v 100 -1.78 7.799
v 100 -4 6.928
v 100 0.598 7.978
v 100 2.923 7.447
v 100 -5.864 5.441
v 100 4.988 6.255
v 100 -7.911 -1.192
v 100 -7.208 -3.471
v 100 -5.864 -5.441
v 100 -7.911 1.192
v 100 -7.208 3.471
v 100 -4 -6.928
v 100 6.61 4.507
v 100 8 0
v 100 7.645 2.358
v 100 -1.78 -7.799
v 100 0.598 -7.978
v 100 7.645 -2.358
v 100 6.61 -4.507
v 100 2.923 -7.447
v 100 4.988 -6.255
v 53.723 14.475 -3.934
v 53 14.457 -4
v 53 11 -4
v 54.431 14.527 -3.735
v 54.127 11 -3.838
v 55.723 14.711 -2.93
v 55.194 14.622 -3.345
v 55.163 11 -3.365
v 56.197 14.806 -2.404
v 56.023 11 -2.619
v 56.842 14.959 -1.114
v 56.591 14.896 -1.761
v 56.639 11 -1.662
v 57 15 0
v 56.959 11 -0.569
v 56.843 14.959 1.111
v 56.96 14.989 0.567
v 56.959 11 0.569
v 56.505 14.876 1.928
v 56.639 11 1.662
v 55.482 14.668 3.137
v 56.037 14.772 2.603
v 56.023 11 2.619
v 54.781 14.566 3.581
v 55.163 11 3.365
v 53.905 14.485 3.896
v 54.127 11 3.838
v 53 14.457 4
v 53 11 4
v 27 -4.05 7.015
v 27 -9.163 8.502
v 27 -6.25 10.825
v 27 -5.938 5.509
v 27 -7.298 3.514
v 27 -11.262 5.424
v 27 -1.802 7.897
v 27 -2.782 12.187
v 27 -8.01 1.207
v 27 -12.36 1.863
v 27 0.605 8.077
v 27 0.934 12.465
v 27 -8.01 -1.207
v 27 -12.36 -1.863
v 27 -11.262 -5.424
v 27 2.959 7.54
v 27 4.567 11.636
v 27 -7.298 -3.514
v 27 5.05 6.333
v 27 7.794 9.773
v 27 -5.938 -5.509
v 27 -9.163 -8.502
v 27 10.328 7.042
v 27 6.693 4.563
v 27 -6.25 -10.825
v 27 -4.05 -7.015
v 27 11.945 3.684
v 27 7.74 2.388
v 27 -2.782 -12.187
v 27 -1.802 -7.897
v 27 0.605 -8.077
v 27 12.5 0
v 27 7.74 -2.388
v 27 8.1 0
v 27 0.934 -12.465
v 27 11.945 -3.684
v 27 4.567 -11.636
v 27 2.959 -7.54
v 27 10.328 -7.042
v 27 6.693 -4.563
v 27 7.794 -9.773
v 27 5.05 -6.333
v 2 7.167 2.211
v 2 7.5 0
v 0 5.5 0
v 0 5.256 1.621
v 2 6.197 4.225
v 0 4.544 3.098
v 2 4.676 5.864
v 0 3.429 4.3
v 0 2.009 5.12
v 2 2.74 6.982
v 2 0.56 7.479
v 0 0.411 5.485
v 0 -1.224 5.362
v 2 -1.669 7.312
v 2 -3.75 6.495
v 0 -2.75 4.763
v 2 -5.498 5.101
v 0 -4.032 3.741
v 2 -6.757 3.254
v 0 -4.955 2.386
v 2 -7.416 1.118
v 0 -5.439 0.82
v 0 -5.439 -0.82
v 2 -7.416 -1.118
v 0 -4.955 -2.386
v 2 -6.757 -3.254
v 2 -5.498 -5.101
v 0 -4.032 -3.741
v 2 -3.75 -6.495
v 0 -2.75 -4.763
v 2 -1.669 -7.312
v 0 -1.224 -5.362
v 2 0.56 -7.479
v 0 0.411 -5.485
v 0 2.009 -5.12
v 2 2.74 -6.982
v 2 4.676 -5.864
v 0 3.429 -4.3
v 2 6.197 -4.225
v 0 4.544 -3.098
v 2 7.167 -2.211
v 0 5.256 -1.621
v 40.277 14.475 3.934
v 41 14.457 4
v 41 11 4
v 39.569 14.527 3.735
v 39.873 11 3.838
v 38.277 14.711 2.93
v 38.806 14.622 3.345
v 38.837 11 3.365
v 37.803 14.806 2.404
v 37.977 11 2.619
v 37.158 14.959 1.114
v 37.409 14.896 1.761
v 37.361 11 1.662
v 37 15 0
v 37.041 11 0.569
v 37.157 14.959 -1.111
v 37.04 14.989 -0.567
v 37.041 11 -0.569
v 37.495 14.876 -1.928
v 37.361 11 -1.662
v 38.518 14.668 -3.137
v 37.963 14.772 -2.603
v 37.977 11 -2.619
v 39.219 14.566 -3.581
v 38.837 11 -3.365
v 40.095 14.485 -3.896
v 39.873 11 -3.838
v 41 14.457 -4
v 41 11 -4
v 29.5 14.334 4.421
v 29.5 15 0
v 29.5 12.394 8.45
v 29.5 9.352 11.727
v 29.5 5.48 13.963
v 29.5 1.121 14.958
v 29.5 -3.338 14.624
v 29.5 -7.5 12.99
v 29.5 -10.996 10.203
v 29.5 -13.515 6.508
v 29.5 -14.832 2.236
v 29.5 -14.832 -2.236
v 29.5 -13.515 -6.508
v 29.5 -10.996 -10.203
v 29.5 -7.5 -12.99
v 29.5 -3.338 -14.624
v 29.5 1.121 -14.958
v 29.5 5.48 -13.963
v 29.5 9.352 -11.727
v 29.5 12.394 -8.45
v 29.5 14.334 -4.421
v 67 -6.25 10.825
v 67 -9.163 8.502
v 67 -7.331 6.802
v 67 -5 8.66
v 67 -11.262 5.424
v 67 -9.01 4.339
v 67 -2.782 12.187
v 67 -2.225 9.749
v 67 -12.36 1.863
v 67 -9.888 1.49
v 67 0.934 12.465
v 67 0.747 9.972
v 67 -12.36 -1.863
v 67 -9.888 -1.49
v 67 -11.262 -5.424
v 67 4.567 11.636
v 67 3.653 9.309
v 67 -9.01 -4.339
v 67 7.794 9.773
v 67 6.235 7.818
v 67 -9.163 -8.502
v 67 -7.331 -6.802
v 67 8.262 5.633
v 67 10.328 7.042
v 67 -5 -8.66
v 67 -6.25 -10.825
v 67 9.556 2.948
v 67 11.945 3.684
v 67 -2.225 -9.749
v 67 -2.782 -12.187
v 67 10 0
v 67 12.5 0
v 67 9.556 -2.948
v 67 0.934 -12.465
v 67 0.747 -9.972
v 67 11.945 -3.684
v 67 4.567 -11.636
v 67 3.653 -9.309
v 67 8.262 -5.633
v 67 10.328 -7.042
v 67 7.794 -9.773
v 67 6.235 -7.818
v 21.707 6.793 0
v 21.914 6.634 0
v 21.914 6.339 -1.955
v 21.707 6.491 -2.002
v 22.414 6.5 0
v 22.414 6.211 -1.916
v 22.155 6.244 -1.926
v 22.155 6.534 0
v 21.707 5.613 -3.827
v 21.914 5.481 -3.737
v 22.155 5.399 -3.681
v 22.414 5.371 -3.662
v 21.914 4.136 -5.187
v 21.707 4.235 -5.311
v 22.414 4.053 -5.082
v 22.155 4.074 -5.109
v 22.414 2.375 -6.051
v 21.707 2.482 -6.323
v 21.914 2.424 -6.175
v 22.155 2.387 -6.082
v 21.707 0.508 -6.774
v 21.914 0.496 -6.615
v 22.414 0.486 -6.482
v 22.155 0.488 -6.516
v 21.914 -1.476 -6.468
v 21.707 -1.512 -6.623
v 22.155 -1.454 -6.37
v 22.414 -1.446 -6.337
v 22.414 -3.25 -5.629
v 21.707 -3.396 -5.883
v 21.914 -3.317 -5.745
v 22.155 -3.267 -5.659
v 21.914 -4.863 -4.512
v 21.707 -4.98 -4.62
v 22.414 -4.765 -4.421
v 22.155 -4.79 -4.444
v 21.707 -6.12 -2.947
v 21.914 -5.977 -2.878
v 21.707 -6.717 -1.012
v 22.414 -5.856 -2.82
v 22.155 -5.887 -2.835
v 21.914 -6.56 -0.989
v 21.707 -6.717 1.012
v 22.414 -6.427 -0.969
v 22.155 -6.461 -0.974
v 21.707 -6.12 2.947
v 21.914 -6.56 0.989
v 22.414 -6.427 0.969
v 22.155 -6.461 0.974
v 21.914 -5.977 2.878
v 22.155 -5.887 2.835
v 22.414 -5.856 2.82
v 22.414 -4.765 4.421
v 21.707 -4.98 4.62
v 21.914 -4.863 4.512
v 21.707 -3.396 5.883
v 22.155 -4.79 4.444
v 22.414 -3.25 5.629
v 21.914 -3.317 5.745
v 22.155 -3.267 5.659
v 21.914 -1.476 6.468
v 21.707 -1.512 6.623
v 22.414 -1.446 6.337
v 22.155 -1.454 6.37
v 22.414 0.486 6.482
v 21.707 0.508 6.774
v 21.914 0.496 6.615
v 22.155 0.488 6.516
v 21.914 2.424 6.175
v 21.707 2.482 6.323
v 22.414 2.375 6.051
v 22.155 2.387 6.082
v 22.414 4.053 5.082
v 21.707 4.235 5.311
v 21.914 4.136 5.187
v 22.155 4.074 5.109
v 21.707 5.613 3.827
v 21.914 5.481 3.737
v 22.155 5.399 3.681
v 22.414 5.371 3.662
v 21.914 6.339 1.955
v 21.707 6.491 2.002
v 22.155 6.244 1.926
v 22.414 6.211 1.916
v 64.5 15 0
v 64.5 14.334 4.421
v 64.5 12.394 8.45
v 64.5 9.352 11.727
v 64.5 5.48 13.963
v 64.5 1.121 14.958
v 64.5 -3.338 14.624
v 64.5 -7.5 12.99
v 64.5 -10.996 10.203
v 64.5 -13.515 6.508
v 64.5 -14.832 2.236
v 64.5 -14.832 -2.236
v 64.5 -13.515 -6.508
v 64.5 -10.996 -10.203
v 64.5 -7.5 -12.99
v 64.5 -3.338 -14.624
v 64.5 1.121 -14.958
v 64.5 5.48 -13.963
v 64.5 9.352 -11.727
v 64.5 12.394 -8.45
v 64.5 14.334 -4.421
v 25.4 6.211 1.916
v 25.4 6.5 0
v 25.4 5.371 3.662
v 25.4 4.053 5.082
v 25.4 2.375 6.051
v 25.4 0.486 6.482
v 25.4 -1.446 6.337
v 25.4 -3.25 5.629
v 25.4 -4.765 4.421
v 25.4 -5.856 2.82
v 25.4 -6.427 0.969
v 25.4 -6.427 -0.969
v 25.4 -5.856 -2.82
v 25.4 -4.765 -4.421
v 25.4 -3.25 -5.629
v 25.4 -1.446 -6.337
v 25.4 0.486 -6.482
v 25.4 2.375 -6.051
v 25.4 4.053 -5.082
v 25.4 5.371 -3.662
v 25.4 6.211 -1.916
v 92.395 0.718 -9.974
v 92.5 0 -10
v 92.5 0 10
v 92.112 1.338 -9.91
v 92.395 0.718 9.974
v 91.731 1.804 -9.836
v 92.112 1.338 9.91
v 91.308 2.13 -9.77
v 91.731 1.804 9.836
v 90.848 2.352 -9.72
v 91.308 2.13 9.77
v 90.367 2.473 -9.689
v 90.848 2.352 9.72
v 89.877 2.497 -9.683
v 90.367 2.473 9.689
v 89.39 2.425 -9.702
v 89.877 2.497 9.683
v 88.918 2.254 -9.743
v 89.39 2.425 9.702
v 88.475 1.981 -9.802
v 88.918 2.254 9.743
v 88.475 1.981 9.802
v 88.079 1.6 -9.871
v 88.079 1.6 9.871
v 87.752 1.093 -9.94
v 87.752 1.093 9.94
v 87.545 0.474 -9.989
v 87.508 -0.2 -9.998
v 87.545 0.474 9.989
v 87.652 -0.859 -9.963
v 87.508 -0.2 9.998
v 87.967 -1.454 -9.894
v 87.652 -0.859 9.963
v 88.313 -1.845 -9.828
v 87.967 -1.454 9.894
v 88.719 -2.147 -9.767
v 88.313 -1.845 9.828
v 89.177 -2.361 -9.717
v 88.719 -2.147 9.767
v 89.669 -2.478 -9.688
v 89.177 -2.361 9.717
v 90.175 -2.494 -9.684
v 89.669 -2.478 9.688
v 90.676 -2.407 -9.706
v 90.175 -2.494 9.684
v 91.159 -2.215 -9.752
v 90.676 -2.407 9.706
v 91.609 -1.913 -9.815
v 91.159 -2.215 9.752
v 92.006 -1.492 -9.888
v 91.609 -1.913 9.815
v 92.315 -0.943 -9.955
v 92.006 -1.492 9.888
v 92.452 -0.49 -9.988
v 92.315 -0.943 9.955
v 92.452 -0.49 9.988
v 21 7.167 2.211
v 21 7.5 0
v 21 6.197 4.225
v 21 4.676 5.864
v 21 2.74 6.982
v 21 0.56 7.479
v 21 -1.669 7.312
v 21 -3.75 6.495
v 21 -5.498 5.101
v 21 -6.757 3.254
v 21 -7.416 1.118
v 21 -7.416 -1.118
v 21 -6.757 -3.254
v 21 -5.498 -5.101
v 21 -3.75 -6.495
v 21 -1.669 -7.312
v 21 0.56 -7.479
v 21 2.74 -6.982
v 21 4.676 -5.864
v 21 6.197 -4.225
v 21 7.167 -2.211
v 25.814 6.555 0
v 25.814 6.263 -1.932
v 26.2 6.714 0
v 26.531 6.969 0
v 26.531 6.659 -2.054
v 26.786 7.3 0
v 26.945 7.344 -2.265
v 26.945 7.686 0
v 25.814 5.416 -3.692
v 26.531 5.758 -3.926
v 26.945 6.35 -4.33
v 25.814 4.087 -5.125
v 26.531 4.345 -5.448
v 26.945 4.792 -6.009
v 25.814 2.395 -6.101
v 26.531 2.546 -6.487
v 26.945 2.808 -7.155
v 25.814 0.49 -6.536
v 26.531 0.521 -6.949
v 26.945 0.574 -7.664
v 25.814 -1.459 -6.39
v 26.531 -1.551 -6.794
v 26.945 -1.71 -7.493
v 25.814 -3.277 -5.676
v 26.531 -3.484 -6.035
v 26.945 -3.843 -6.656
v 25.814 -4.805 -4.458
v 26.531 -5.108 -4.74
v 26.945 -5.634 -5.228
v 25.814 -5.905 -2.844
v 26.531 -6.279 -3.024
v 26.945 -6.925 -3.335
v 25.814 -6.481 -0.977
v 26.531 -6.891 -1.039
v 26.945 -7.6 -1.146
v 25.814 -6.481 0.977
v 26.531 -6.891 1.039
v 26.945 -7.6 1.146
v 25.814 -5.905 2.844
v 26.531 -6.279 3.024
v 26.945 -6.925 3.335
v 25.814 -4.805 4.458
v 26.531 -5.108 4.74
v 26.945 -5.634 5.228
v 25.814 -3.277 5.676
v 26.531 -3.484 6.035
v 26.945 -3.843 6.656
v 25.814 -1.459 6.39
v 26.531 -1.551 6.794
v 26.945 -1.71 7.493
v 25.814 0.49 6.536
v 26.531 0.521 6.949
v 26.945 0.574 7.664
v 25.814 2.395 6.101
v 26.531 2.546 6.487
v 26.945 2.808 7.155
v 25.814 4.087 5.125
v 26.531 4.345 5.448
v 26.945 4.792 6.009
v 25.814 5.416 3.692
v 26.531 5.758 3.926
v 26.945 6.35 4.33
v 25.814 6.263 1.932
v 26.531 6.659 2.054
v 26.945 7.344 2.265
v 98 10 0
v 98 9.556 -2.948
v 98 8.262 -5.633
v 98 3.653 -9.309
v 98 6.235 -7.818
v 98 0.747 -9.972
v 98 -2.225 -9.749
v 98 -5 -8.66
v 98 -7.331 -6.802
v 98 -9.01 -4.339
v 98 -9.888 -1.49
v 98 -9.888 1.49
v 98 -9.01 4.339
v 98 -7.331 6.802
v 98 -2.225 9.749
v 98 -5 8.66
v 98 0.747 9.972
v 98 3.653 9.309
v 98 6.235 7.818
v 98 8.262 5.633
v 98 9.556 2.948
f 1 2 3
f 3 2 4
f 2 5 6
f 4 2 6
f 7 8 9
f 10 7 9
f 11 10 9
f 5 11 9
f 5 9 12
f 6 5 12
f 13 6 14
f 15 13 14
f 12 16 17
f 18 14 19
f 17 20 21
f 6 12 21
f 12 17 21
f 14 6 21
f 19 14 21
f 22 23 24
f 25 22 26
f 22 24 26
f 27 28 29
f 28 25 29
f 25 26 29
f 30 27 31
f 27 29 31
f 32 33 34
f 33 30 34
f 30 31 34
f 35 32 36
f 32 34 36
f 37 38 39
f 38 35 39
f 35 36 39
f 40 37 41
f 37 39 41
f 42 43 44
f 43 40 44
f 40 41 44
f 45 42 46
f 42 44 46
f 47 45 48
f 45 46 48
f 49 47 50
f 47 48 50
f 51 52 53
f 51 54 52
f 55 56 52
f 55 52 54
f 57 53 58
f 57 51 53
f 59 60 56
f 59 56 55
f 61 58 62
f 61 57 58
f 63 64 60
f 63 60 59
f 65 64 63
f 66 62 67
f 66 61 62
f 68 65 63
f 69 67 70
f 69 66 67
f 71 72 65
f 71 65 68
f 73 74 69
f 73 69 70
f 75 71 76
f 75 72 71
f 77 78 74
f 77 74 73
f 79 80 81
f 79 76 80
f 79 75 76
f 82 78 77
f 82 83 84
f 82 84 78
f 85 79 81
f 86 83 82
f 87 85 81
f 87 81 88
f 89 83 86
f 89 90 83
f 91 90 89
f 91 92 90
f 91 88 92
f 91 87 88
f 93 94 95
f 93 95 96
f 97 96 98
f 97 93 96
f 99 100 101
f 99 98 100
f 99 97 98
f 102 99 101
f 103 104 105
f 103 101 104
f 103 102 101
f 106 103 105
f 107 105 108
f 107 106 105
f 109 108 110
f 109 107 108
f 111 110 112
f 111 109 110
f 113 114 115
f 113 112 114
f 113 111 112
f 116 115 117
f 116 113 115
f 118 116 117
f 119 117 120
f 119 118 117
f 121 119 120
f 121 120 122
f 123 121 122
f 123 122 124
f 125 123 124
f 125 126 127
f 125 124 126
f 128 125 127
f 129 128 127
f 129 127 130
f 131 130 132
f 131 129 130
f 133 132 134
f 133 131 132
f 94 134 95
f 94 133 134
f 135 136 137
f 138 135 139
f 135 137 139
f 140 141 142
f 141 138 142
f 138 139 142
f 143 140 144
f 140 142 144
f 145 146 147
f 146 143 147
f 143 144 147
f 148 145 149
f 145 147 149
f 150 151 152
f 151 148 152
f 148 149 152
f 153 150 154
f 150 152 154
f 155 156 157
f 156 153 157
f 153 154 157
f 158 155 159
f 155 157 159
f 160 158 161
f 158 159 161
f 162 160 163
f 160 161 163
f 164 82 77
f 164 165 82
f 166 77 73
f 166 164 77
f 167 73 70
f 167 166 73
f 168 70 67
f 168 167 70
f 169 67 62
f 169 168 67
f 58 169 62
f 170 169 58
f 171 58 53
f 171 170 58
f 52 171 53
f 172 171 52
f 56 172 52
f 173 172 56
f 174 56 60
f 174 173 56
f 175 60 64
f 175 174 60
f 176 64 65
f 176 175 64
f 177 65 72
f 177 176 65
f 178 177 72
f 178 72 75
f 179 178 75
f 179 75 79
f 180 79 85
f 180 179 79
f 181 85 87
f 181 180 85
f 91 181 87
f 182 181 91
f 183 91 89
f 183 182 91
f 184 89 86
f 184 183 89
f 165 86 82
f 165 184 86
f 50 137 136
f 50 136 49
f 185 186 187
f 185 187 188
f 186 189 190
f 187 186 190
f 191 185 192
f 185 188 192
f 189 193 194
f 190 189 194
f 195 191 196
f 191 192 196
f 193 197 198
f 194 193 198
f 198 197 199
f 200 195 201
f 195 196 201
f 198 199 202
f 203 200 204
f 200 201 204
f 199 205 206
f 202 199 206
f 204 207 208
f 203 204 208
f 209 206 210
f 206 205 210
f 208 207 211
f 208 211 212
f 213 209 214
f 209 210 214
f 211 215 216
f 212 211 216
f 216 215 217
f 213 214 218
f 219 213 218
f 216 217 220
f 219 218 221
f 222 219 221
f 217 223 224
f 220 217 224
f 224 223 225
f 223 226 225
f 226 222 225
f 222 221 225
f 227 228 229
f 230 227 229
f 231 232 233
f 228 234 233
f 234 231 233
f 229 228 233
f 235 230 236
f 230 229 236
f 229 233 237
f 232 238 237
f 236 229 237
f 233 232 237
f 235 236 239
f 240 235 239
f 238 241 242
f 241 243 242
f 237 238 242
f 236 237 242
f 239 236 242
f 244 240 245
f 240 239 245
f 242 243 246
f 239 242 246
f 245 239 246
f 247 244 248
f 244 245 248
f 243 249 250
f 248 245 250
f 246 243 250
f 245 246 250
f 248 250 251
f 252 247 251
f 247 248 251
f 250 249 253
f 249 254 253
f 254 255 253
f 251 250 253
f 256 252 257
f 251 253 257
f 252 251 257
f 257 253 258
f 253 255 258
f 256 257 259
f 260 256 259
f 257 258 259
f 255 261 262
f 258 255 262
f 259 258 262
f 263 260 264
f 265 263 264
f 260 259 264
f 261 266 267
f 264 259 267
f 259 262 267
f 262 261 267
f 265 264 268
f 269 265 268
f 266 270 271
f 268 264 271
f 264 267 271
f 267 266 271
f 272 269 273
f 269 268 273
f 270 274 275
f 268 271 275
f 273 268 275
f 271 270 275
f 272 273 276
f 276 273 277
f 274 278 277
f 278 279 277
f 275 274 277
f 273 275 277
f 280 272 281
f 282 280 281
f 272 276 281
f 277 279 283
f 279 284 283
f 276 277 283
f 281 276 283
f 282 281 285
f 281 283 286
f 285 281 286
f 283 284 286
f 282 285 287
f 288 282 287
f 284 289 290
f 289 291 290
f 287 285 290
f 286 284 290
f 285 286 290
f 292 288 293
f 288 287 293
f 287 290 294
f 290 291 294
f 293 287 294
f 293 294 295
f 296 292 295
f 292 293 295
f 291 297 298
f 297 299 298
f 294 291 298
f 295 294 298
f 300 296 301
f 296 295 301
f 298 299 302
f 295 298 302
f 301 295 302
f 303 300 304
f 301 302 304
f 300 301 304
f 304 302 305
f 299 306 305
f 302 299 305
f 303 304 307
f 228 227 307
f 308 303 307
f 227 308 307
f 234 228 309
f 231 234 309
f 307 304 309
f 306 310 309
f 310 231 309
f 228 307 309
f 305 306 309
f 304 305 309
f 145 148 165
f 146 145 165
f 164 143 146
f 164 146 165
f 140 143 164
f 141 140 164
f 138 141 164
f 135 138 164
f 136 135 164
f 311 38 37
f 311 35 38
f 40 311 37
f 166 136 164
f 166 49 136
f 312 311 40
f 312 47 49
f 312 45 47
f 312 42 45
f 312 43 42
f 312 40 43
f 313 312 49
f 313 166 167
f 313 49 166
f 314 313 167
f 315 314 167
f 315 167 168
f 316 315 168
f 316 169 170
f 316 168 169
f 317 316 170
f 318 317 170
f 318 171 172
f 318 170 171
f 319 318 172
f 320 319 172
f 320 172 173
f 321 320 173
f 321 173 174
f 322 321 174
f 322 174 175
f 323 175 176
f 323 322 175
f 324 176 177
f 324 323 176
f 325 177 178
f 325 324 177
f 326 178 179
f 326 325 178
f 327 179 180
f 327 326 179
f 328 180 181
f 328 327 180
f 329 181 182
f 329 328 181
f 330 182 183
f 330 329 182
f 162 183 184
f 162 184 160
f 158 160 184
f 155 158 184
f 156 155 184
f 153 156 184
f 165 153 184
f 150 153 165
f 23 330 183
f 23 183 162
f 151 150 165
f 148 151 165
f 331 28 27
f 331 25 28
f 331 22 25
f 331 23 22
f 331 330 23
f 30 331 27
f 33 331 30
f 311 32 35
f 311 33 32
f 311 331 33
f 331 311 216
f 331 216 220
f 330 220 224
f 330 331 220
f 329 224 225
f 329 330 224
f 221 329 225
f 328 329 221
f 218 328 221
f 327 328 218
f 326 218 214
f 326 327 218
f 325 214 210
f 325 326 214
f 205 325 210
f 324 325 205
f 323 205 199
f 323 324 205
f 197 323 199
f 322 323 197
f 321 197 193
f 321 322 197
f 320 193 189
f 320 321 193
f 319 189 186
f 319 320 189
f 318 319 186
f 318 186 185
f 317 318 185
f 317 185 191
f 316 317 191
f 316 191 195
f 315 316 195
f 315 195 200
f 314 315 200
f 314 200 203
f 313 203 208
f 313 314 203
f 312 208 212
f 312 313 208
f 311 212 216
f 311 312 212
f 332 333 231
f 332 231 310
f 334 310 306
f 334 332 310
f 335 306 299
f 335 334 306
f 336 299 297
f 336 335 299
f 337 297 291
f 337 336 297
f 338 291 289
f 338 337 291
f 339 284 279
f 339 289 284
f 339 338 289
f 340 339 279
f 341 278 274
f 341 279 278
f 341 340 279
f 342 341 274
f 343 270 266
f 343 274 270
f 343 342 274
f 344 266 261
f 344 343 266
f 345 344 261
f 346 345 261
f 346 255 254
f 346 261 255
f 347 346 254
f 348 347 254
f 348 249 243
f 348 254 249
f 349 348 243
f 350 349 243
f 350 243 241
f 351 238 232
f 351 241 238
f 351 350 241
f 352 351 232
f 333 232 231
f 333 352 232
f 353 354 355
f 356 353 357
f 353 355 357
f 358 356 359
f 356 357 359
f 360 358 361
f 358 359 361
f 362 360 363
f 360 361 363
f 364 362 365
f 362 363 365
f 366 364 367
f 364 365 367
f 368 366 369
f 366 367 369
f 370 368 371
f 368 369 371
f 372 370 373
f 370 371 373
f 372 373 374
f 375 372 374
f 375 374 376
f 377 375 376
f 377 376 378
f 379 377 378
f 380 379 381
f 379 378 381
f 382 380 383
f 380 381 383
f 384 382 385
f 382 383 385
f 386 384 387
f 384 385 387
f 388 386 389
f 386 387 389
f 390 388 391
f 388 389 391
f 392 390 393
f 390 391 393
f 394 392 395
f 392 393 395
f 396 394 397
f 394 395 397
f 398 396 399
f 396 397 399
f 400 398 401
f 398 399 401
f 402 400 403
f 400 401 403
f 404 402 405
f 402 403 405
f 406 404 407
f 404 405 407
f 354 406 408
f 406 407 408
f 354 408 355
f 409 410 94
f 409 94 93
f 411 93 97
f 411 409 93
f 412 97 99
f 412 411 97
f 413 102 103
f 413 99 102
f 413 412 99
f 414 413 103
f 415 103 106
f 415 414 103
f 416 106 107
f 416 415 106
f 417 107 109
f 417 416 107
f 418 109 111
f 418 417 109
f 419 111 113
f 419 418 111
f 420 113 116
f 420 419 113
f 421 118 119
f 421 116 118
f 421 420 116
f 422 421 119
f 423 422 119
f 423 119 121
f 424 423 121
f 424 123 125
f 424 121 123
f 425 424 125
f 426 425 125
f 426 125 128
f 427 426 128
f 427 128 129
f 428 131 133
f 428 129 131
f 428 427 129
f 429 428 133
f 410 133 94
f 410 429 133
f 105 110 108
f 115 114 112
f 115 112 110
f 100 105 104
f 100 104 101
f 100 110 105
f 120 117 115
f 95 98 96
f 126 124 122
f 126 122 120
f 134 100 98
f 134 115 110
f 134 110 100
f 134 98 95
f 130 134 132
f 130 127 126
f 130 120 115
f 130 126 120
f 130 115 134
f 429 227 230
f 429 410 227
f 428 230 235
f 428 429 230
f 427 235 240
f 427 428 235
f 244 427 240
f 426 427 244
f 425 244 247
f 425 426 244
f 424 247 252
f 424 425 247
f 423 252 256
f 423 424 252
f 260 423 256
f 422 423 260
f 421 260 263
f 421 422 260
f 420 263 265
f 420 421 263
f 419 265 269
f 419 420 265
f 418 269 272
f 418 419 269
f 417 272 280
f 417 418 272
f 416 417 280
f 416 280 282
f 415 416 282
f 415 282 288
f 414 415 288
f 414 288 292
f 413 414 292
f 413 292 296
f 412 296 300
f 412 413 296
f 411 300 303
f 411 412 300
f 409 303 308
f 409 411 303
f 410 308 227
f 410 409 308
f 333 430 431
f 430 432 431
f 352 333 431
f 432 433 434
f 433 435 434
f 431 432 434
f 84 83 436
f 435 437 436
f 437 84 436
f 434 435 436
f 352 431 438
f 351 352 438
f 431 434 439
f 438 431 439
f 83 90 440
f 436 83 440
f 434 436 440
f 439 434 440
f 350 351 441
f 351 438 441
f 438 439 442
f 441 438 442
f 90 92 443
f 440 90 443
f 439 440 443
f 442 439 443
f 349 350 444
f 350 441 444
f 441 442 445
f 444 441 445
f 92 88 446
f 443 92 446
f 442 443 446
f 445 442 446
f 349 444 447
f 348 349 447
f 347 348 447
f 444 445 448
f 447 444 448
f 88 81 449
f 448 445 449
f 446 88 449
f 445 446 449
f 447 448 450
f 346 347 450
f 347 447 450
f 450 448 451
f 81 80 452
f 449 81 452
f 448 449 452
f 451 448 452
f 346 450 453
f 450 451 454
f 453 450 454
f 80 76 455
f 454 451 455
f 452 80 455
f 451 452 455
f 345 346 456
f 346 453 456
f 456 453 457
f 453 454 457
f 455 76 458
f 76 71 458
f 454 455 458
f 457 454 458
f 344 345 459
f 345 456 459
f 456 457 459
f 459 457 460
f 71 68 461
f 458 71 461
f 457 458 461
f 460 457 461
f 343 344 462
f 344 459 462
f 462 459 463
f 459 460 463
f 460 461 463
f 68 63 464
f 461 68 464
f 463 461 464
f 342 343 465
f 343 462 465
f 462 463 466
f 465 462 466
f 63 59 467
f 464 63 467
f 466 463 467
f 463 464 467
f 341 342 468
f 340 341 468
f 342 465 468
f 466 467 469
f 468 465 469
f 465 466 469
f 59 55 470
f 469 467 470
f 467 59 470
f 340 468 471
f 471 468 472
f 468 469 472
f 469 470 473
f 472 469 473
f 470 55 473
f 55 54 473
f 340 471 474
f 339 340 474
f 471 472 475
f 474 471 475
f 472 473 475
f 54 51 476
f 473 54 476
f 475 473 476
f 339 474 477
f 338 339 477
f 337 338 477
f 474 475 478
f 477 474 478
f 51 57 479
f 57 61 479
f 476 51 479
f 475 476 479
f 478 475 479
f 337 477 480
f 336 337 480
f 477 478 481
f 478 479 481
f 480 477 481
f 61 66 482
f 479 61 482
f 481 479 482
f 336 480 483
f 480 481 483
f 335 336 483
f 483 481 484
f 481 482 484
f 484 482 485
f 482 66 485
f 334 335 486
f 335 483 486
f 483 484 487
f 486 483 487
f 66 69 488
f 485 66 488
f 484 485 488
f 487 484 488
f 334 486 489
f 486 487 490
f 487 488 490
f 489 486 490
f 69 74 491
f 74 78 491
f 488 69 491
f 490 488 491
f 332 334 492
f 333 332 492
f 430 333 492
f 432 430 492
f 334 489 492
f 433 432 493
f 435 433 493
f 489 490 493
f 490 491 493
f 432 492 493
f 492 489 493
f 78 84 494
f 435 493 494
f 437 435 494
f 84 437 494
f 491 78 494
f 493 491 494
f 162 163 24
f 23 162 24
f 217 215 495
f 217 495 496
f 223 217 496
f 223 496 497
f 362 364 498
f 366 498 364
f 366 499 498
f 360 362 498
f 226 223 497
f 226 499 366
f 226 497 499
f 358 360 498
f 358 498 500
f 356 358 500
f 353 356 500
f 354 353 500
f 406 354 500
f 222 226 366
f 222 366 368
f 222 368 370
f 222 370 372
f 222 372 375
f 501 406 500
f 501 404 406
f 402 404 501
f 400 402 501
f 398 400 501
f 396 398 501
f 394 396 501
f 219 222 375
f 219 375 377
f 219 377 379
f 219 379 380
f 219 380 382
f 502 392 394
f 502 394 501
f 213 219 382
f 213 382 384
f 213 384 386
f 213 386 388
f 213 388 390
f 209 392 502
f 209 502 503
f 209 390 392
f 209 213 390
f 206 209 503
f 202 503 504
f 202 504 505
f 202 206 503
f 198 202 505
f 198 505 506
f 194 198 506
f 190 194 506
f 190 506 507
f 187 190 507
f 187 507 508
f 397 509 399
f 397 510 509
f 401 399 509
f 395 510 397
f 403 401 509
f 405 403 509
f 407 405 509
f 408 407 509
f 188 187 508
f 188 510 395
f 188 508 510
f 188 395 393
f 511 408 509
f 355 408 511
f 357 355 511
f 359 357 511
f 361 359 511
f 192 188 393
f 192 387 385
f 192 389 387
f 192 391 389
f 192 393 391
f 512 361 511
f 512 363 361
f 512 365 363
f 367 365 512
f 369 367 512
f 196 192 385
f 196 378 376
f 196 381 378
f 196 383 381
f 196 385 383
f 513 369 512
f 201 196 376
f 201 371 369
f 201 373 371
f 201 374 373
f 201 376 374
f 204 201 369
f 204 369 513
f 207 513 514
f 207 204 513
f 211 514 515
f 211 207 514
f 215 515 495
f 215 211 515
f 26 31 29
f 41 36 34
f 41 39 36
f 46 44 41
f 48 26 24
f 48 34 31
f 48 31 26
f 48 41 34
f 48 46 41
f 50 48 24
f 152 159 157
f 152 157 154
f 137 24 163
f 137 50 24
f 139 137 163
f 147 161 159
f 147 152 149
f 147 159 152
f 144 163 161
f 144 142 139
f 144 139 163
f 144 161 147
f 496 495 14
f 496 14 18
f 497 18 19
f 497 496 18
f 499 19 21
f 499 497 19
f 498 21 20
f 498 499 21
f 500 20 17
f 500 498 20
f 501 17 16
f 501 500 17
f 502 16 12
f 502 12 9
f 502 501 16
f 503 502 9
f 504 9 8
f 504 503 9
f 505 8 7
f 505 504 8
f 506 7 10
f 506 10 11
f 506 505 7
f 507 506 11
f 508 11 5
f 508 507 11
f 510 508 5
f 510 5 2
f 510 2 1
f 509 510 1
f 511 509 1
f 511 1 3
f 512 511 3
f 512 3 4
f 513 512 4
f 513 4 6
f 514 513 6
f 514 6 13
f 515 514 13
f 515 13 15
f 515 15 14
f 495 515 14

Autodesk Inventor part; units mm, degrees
ref_plane "YZ Plane" through (0, 0, 0) normal (1, 0, 0) x (0, 1, 0)
ref_plane "XY Plane" through (0, 0, 0) normal (0, 0, 1) x (1, 0, 0)
sketch "Эскиз1" plane through (0, 0, 0) normal (0, 0, 1) x (1, 0, 0)
  line L0 (0, 0) -> (0, 7.5)
  line L1 (22.4142, 6.5) -> (25.4, 6.5)
  line L2 (27, 8.1) -> (27, 15)
  line L3 (27, 15) -> (67, 15)
  line L4 (100, 10) -> (100, 0)
  line L5 (100, 0) -> (0, 0)
  line L6 (0, 7.5) -> (21, 7.5)
  line L7 (21, 7.5) -> (21.7071, 6.7929)
  line L8 (100, 10) -> (67, 10)
  line L9 (67, 15) -> (67, 10)
  arc A0 (21.7071, 6.7929) -> (22.4142, 6.5) centre (22.4142, 7.5) ccw
  arc A1 (25.4, 6.5) -> (27, 8.1) centre (25.4, 8.1) ccw
  point P0 (22, 6.5)
  point P1 (27, 6.5)
  point P2 (67, 12.5)
  dimension "d0" = 27
  dimension "d4" = 100
  dimension "d14" = 6.5
  dimension "d21" = 135
  dimension "d22" = 1
  dimension "d23" = 5
  dimension "d26" = 10
  dimension "d27" = 40
  dimension "d28" = 15
  dimension "d70" = 1
  dimension "d71" = 1.6
revolve "Вращение1" add sketch "Эскиз1" angle 360 about axis through (100, 0, 0) along (-1, 0, 0)
sketch "Эскиз2" plane through (0, 0, 0) normal (0, 0, 1) x (1, 0, 0)
  point P0 (0, 0)
sketch "Эскиз4" plane through (0, 0, 0) normal (0, 0, 1) x (1, 0, 0)
  circle A0 centre (90, 0) radius 2.5
  line L0 (100, -10) -> (100, 10) projected
  point P0 (0, 0)
  dimension "d38" = 10
  dimension "d39" = 5
  dimension "d40" = 90
extrude "Выдавливание2" cut sketch "Эскиз4" along normal through all both and the other way through all
thread "Резьба1" size "M16x1" class "6g" standard "ISO Metric profile" full length
chamfer "Фаска1" distance 2 angle 45 1 edges at (0, -7.5, 0)
chamfer "Фаска2" distance 2.5 angle 45 1 edges at (67, -15, 0) measured on face at (67, 13.0912, 1.9943)
chamfer "Фаска3" distance 2 angle 45 1 edges at (100, -10, 0) measured on face at (100, -0.4018, -2.9244)
chamfer "Фаска4" distance 2.5 angle 45 1 edges at (27, -15, 0) measured on face at (27, 12.5547, 1.1966)
ref_plane "РабПлоскость1" through (0, 11, 0) normal (0, 1, 0) x (-1, 0, 0)
sketch "Эскиз5" plane through (0, 11, 0) normal (0, 1, 0) x (-1, 0, 0)
  line L0 (-29.5, -15) -> (-29.5, 15) projected
  line L1 (11.4, 0) -> (-68.4, 0) projected
  line L2 (-27, -8.5) -> (-27, 8.5) projected
  arc A0 (-41, -4) -> (-41, 4) centre (-41, 0) ccw
  line L3 (-41, -4) -> (-53, -4)
  arc A1 (-53, 4) -> (-53, -4) centre (-53, 0) ccw
  line L4 (-41, 4) -> (-53, 4)
  point P0 (0, 0)
  dimension "d66" = 10
  dimension "d67" = 20
  dimension "d68" = 8
  dimension "d69" = 4
extrude "Выдавливание3" cut sketch "Эскиз5" along normal blind 4
properties part number "Вал"
